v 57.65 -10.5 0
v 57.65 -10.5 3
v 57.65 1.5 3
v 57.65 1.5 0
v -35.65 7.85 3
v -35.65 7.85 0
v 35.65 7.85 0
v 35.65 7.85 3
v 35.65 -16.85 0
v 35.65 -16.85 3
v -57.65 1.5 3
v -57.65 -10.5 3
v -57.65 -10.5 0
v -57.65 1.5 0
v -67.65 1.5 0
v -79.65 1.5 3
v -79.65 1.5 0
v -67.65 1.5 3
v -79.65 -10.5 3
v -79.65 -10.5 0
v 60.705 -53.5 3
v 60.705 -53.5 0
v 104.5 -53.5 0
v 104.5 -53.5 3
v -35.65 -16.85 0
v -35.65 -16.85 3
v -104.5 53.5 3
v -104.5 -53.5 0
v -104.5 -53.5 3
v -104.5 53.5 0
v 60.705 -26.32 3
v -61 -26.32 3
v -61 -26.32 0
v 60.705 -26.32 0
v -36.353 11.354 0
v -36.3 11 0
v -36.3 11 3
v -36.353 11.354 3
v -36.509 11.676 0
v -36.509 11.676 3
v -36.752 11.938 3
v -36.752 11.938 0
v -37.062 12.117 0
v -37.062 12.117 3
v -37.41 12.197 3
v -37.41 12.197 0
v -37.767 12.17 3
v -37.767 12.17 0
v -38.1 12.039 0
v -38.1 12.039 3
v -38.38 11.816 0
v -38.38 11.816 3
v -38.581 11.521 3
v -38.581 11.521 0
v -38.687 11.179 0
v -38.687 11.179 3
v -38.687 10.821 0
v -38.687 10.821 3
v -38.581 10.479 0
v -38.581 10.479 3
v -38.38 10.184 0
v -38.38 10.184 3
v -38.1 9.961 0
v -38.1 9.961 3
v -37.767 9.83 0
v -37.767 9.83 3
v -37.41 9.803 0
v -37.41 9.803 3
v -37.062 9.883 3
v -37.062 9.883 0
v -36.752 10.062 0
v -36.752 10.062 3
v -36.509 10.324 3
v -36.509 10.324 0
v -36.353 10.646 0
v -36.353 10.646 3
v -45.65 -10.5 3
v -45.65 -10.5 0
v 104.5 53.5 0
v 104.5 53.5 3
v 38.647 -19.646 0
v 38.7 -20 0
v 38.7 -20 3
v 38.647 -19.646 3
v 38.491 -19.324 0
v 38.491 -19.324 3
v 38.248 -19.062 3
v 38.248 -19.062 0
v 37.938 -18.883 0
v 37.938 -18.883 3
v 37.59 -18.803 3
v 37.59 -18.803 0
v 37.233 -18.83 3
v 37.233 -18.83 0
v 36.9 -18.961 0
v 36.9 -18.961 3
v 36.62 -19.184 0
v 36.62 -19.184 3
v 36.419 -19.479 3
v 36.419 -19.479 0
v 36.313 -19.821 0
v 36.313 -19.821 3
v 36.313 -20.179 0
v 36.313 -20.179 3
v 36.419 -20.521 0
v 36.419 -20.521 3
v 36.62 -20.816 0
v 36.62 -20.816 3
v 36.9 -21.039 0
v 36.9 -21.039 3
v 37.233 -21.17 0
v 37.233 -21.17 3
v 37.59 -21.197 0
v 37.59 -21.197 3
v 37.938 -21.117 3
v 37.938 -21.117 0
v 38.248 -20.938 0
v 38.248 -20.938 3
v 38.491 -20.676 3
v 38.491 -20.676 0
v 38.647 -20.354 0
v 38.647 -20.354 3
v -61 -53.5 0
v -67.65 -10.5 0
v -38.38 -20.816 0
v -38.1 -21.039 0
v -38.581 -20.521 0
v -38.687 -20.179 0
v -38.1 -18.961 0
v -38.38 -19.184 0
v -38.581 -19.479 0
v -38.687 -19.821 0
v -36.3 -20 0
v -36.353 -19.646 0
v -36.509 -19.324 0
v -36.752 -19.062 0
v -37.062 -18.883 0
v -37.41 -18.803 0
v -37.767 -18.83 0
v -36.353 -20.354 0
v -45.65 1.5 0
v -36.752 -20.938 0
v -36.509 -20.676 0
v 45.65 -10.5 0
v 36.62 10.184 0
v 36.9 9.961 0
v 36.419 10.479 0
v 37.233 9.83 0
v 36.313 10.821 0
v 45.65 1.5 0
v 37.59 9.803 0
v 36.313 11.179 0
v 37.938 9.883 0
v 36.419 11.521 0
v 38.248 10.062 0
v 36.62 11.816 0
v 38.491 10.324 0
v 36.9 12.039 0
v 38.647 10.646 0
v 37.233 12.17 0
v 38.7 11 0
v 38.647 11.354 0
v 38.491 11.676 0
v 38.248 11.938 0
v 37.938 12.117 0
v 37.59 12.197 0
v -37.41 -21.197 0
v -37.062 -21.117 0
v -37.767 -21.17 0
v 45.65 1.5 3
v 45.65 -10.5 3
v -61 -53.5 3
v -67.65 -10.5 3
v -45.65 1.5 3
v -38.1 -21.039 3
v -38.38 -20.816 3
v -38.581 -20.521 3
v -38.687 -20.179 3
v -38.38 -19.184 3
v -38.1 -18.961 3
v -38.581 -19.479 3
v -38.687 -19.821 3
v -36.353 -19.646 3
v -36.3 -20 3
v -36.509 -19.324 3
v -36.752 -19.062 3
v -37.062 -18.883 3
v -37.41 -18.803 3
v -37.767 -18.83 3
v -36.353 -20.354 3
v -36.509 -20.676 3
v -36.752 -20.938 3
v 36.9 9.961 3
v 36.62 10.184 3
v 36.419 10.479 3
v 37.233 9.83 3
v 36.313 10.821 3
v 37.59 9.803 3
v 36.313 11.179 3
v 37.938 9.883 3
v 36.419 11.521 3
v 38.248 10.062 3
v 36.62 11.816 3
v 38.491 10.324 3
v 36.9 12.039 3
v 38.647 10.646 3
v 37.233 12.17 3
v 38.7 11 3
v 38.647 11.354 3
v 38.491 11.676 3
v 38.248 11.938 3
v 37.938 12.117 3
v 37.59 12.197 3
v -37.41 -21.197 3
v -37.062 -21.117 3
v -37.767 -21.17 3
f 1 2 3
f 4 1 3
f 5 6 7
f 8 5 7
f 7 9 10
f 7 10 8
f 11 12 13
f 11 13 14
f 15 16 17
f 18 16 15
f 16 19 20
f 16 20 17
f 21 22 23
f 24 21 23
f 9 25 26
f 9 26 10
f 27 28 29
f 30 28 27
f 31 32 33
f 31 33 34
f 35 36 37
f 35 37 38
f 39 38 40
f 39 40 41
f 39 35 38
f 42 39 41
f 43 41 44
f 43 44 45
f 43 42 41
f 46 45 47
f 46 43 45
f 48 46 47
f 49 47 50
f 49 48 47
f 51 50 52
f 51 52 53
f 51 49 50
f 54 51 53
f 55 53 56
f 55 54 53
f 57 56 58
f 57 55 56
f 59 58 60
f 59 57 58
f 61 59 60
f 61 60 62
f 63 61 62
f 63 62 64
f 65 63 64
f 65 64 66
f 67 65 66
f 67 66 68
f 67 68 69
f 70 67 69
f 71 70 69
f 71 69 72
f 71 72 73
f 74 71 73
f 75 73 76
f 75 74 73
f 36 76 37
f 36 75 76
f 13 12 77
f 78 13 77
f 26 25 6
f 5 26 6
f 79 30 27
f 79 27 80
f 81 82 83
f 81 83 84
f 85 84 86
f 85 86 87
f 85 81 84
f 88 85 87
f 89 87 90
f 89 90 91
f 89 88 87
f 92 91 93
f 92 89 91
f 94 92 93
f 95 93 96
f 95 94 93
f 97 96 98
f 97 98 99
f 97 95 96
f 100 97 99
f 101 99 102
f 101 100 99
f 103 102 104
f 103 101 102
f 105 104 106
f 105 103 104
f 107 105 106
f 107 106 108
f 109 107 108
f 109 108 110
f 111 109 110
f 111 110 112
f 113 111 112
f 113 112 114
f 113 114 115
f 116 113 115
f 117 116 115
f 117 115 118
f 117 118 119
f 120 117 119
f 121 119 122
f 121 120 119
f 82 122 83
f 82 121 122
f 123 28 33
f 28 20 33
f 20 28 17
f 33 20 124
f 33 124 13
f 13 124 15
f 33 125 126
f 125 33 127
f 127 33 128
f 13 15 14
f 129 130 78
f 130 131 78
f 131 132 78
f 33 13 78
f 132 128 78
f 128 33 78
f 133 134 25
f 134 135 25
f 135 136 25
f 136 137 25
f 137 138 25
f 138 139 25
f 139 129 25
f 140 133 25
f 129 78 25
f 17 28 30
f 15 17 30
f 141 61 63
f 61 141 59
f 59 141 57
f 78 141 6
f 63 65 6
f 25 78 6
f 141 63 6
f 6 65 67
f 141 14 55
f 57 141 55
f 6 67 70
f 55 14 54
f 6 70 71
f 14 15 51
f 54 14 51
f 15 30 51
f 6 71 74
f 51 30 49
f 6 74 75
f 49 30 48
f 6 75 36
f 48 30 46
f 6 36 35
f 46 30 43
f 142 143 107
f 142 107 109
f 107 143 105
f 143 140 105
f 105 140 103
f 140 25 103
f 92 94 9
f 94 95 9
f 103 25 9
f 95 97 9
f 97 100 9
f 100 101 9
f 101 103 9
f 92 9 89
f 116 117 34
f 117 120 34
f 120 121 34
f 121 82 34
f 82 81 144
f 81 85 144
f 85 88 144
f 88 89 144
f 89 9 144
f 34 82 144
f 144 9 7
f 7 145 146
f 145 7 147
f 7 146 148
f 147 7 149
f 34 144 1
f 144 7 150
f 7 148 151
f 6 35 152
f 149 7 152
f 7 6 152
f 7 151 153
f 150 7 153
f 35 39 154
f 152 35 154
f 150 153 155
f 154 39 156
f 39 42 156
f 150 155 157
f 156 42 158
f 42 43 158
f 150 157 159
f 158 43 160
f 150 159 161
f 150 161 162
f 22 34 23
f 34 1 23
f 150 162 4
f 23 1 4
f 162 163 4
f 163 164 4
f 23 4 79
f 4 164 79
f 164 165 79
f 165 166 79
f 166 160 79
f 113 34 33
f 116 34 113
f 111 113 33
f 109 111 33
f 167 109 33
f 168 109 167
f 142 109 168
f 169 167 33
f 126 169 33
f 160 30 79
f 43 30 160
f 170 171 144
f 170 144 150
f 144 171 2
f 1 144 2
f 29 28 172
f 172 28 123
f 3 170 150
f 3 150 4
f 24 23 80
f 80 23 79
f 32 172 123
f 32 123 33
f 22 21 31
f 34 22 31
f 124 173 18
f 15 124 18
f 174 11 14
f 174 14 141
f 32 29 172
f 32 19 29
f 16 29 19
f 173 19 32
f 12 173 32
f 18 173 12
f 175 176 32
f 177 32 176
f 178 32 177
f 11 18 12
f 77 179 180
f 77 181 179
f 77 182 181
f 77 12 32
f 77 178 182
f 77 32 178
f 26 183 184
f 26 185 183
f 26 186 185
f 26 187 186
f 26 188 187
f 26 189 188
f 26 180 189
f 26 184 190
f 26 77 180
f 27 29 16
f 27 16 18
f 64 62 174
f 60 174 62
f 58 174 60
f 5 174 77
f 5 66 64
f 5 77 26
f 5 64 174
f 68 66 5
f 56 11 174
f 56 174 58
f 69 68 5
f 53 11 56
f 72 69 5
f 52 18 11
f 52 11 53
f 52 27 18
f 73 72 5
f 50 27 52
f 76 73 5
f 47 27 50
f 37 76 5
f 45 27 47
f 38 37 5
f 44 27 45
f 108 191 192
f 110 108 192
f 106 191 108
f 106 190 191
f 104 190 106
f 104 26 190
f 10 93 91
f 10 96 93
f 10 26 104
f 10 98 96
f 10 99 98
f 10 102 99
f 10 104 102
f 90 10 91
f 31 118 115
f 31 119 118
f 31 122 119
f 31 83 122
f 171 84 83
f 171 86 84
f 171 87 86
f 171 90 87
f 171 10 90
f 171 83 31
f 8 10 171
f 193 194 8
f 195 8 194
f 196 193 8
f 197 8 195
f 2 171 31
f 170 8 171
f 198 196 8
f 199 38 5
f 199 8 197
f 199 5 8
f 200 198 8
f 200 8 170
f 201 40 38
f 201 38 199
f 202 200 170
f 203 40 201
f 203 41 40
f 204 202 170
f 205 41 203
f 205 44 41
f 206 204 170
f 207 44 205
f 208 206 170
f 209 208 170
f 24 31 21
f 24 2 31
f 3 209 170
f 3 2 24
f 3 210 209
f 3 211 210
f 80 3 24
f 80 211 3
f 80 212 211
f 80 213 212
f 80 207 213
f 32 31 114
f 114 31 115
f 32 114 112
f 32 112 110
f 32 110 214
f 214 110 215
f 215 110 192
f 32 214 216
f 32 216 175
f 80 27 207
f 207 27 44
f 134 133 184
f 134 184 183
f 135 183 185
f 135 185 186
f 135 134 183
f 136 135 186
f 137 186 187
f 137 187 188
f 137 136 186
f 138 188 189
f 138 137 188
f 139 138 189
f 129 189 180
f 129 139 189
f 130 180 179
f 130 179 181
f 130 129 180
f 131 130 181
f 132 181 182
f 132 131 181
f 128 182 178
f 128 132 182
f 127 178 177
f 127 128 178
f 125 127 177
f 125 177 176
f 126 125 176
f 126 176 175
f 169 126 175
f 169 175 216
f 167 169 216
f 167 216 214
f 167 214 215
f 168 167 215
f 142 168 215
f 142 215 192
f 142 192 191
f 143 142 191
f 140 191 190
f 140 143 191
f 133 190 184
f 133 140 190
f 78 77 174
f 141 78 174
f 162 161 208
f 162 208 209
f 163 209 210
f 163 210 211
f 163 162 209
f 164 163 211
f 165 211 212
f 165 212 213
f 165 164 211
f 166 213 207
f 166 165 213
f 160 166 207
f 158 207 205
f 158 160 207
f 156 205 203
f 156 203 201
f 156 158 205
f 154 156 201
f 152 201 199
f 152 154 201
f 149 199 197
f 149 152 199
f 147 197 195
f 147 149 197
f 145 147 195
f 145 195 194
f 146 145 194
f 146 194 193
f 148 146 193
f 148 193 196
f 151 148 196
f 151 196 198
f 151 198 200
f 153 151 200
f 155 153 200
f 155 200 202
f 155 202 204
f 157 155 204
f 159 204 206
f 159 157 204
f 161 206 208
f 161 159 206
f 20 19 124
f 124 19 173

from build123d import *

# Parameters (mm, degrees)
SKETCH1_W           = 209
SKETCH1_H           = 107
SKETCH1_R           = 1.2
SKETCH1_W_2         = 71.3
SKETCH1_H_2         = 24.7
BOSS_EXTRUDE1_DEPTH = 3
SKETCH3_W           = 121.70473961
SKETCH3_H           = 27.18
CUT_EXTRUDE1_DEPTH  = 4
SKETCH4_W           = 12
SKETCH4_H           = 12
CUT_EXTRUDE2_DEPTH  = 4


with BuildPart() as part:
    # Sketch1 → Boss-Extrude1 (new body)
    with BuildSketch(Plane.XY):
        Rectangle(SKETCH1_W, SKETCH1_H)
        with Locations((-37.5, 11)):
            Circle(SKETCH1_R, mode=Mode.SUBTRACT)
        with Locations((37.5, 11)):
            Circle(SKETCH1_R, mode=Mode.SUBTRACT)
        with Locations((37.5, -20)):
            Circle(SKETCH1_R, mode=Mode.SUBTRACT)
        with Locations((-37.5, -20)):
            Circle(SKETCH1_R, mode=Mode.SUBTRACT)
        with Locations((0, -4.5)):
            Rectangle(SKETCH1_W_2, SKETCH1_H_2, mode=Mode.SUBTRACT)
    extrude(amount=BOSS_EXTRUDE1_DEPTH)

    # Sketch3 → Cut-Extrude1 (cut, through all)
    with BuildSketch(Plane.XY.offset(3)):
        with Locations((-0.147630195, -39.91)):
            Rectangle(SKETCH3_W, SKETCH3_H)
    extrude(amount=-CUT_EXTRUDE1_DEPTH, mode=Mode.SUBTRACT)

    # Sketch4 → Cut-Extrude2 (cut, through all)
    with BuildSketch(Plane.XY.offset(3)):
        with Locations((-51.65, -4.5)):
            Rectangle(SKETCH4_W, SKETCH4_H)
        with Locations((-73.65, -4.5)):
            Rectangle(SKETCH4_W, SKETCH4_H)
        with Locations((51.65, -4.5)):
            Rectangle(SKETCH4_W, SKETCH4_H)
    extrude(amount=-CUT_EXTRUDE2_DEPTH, mode=Mode.SUBTRACT)


solid = part.part
